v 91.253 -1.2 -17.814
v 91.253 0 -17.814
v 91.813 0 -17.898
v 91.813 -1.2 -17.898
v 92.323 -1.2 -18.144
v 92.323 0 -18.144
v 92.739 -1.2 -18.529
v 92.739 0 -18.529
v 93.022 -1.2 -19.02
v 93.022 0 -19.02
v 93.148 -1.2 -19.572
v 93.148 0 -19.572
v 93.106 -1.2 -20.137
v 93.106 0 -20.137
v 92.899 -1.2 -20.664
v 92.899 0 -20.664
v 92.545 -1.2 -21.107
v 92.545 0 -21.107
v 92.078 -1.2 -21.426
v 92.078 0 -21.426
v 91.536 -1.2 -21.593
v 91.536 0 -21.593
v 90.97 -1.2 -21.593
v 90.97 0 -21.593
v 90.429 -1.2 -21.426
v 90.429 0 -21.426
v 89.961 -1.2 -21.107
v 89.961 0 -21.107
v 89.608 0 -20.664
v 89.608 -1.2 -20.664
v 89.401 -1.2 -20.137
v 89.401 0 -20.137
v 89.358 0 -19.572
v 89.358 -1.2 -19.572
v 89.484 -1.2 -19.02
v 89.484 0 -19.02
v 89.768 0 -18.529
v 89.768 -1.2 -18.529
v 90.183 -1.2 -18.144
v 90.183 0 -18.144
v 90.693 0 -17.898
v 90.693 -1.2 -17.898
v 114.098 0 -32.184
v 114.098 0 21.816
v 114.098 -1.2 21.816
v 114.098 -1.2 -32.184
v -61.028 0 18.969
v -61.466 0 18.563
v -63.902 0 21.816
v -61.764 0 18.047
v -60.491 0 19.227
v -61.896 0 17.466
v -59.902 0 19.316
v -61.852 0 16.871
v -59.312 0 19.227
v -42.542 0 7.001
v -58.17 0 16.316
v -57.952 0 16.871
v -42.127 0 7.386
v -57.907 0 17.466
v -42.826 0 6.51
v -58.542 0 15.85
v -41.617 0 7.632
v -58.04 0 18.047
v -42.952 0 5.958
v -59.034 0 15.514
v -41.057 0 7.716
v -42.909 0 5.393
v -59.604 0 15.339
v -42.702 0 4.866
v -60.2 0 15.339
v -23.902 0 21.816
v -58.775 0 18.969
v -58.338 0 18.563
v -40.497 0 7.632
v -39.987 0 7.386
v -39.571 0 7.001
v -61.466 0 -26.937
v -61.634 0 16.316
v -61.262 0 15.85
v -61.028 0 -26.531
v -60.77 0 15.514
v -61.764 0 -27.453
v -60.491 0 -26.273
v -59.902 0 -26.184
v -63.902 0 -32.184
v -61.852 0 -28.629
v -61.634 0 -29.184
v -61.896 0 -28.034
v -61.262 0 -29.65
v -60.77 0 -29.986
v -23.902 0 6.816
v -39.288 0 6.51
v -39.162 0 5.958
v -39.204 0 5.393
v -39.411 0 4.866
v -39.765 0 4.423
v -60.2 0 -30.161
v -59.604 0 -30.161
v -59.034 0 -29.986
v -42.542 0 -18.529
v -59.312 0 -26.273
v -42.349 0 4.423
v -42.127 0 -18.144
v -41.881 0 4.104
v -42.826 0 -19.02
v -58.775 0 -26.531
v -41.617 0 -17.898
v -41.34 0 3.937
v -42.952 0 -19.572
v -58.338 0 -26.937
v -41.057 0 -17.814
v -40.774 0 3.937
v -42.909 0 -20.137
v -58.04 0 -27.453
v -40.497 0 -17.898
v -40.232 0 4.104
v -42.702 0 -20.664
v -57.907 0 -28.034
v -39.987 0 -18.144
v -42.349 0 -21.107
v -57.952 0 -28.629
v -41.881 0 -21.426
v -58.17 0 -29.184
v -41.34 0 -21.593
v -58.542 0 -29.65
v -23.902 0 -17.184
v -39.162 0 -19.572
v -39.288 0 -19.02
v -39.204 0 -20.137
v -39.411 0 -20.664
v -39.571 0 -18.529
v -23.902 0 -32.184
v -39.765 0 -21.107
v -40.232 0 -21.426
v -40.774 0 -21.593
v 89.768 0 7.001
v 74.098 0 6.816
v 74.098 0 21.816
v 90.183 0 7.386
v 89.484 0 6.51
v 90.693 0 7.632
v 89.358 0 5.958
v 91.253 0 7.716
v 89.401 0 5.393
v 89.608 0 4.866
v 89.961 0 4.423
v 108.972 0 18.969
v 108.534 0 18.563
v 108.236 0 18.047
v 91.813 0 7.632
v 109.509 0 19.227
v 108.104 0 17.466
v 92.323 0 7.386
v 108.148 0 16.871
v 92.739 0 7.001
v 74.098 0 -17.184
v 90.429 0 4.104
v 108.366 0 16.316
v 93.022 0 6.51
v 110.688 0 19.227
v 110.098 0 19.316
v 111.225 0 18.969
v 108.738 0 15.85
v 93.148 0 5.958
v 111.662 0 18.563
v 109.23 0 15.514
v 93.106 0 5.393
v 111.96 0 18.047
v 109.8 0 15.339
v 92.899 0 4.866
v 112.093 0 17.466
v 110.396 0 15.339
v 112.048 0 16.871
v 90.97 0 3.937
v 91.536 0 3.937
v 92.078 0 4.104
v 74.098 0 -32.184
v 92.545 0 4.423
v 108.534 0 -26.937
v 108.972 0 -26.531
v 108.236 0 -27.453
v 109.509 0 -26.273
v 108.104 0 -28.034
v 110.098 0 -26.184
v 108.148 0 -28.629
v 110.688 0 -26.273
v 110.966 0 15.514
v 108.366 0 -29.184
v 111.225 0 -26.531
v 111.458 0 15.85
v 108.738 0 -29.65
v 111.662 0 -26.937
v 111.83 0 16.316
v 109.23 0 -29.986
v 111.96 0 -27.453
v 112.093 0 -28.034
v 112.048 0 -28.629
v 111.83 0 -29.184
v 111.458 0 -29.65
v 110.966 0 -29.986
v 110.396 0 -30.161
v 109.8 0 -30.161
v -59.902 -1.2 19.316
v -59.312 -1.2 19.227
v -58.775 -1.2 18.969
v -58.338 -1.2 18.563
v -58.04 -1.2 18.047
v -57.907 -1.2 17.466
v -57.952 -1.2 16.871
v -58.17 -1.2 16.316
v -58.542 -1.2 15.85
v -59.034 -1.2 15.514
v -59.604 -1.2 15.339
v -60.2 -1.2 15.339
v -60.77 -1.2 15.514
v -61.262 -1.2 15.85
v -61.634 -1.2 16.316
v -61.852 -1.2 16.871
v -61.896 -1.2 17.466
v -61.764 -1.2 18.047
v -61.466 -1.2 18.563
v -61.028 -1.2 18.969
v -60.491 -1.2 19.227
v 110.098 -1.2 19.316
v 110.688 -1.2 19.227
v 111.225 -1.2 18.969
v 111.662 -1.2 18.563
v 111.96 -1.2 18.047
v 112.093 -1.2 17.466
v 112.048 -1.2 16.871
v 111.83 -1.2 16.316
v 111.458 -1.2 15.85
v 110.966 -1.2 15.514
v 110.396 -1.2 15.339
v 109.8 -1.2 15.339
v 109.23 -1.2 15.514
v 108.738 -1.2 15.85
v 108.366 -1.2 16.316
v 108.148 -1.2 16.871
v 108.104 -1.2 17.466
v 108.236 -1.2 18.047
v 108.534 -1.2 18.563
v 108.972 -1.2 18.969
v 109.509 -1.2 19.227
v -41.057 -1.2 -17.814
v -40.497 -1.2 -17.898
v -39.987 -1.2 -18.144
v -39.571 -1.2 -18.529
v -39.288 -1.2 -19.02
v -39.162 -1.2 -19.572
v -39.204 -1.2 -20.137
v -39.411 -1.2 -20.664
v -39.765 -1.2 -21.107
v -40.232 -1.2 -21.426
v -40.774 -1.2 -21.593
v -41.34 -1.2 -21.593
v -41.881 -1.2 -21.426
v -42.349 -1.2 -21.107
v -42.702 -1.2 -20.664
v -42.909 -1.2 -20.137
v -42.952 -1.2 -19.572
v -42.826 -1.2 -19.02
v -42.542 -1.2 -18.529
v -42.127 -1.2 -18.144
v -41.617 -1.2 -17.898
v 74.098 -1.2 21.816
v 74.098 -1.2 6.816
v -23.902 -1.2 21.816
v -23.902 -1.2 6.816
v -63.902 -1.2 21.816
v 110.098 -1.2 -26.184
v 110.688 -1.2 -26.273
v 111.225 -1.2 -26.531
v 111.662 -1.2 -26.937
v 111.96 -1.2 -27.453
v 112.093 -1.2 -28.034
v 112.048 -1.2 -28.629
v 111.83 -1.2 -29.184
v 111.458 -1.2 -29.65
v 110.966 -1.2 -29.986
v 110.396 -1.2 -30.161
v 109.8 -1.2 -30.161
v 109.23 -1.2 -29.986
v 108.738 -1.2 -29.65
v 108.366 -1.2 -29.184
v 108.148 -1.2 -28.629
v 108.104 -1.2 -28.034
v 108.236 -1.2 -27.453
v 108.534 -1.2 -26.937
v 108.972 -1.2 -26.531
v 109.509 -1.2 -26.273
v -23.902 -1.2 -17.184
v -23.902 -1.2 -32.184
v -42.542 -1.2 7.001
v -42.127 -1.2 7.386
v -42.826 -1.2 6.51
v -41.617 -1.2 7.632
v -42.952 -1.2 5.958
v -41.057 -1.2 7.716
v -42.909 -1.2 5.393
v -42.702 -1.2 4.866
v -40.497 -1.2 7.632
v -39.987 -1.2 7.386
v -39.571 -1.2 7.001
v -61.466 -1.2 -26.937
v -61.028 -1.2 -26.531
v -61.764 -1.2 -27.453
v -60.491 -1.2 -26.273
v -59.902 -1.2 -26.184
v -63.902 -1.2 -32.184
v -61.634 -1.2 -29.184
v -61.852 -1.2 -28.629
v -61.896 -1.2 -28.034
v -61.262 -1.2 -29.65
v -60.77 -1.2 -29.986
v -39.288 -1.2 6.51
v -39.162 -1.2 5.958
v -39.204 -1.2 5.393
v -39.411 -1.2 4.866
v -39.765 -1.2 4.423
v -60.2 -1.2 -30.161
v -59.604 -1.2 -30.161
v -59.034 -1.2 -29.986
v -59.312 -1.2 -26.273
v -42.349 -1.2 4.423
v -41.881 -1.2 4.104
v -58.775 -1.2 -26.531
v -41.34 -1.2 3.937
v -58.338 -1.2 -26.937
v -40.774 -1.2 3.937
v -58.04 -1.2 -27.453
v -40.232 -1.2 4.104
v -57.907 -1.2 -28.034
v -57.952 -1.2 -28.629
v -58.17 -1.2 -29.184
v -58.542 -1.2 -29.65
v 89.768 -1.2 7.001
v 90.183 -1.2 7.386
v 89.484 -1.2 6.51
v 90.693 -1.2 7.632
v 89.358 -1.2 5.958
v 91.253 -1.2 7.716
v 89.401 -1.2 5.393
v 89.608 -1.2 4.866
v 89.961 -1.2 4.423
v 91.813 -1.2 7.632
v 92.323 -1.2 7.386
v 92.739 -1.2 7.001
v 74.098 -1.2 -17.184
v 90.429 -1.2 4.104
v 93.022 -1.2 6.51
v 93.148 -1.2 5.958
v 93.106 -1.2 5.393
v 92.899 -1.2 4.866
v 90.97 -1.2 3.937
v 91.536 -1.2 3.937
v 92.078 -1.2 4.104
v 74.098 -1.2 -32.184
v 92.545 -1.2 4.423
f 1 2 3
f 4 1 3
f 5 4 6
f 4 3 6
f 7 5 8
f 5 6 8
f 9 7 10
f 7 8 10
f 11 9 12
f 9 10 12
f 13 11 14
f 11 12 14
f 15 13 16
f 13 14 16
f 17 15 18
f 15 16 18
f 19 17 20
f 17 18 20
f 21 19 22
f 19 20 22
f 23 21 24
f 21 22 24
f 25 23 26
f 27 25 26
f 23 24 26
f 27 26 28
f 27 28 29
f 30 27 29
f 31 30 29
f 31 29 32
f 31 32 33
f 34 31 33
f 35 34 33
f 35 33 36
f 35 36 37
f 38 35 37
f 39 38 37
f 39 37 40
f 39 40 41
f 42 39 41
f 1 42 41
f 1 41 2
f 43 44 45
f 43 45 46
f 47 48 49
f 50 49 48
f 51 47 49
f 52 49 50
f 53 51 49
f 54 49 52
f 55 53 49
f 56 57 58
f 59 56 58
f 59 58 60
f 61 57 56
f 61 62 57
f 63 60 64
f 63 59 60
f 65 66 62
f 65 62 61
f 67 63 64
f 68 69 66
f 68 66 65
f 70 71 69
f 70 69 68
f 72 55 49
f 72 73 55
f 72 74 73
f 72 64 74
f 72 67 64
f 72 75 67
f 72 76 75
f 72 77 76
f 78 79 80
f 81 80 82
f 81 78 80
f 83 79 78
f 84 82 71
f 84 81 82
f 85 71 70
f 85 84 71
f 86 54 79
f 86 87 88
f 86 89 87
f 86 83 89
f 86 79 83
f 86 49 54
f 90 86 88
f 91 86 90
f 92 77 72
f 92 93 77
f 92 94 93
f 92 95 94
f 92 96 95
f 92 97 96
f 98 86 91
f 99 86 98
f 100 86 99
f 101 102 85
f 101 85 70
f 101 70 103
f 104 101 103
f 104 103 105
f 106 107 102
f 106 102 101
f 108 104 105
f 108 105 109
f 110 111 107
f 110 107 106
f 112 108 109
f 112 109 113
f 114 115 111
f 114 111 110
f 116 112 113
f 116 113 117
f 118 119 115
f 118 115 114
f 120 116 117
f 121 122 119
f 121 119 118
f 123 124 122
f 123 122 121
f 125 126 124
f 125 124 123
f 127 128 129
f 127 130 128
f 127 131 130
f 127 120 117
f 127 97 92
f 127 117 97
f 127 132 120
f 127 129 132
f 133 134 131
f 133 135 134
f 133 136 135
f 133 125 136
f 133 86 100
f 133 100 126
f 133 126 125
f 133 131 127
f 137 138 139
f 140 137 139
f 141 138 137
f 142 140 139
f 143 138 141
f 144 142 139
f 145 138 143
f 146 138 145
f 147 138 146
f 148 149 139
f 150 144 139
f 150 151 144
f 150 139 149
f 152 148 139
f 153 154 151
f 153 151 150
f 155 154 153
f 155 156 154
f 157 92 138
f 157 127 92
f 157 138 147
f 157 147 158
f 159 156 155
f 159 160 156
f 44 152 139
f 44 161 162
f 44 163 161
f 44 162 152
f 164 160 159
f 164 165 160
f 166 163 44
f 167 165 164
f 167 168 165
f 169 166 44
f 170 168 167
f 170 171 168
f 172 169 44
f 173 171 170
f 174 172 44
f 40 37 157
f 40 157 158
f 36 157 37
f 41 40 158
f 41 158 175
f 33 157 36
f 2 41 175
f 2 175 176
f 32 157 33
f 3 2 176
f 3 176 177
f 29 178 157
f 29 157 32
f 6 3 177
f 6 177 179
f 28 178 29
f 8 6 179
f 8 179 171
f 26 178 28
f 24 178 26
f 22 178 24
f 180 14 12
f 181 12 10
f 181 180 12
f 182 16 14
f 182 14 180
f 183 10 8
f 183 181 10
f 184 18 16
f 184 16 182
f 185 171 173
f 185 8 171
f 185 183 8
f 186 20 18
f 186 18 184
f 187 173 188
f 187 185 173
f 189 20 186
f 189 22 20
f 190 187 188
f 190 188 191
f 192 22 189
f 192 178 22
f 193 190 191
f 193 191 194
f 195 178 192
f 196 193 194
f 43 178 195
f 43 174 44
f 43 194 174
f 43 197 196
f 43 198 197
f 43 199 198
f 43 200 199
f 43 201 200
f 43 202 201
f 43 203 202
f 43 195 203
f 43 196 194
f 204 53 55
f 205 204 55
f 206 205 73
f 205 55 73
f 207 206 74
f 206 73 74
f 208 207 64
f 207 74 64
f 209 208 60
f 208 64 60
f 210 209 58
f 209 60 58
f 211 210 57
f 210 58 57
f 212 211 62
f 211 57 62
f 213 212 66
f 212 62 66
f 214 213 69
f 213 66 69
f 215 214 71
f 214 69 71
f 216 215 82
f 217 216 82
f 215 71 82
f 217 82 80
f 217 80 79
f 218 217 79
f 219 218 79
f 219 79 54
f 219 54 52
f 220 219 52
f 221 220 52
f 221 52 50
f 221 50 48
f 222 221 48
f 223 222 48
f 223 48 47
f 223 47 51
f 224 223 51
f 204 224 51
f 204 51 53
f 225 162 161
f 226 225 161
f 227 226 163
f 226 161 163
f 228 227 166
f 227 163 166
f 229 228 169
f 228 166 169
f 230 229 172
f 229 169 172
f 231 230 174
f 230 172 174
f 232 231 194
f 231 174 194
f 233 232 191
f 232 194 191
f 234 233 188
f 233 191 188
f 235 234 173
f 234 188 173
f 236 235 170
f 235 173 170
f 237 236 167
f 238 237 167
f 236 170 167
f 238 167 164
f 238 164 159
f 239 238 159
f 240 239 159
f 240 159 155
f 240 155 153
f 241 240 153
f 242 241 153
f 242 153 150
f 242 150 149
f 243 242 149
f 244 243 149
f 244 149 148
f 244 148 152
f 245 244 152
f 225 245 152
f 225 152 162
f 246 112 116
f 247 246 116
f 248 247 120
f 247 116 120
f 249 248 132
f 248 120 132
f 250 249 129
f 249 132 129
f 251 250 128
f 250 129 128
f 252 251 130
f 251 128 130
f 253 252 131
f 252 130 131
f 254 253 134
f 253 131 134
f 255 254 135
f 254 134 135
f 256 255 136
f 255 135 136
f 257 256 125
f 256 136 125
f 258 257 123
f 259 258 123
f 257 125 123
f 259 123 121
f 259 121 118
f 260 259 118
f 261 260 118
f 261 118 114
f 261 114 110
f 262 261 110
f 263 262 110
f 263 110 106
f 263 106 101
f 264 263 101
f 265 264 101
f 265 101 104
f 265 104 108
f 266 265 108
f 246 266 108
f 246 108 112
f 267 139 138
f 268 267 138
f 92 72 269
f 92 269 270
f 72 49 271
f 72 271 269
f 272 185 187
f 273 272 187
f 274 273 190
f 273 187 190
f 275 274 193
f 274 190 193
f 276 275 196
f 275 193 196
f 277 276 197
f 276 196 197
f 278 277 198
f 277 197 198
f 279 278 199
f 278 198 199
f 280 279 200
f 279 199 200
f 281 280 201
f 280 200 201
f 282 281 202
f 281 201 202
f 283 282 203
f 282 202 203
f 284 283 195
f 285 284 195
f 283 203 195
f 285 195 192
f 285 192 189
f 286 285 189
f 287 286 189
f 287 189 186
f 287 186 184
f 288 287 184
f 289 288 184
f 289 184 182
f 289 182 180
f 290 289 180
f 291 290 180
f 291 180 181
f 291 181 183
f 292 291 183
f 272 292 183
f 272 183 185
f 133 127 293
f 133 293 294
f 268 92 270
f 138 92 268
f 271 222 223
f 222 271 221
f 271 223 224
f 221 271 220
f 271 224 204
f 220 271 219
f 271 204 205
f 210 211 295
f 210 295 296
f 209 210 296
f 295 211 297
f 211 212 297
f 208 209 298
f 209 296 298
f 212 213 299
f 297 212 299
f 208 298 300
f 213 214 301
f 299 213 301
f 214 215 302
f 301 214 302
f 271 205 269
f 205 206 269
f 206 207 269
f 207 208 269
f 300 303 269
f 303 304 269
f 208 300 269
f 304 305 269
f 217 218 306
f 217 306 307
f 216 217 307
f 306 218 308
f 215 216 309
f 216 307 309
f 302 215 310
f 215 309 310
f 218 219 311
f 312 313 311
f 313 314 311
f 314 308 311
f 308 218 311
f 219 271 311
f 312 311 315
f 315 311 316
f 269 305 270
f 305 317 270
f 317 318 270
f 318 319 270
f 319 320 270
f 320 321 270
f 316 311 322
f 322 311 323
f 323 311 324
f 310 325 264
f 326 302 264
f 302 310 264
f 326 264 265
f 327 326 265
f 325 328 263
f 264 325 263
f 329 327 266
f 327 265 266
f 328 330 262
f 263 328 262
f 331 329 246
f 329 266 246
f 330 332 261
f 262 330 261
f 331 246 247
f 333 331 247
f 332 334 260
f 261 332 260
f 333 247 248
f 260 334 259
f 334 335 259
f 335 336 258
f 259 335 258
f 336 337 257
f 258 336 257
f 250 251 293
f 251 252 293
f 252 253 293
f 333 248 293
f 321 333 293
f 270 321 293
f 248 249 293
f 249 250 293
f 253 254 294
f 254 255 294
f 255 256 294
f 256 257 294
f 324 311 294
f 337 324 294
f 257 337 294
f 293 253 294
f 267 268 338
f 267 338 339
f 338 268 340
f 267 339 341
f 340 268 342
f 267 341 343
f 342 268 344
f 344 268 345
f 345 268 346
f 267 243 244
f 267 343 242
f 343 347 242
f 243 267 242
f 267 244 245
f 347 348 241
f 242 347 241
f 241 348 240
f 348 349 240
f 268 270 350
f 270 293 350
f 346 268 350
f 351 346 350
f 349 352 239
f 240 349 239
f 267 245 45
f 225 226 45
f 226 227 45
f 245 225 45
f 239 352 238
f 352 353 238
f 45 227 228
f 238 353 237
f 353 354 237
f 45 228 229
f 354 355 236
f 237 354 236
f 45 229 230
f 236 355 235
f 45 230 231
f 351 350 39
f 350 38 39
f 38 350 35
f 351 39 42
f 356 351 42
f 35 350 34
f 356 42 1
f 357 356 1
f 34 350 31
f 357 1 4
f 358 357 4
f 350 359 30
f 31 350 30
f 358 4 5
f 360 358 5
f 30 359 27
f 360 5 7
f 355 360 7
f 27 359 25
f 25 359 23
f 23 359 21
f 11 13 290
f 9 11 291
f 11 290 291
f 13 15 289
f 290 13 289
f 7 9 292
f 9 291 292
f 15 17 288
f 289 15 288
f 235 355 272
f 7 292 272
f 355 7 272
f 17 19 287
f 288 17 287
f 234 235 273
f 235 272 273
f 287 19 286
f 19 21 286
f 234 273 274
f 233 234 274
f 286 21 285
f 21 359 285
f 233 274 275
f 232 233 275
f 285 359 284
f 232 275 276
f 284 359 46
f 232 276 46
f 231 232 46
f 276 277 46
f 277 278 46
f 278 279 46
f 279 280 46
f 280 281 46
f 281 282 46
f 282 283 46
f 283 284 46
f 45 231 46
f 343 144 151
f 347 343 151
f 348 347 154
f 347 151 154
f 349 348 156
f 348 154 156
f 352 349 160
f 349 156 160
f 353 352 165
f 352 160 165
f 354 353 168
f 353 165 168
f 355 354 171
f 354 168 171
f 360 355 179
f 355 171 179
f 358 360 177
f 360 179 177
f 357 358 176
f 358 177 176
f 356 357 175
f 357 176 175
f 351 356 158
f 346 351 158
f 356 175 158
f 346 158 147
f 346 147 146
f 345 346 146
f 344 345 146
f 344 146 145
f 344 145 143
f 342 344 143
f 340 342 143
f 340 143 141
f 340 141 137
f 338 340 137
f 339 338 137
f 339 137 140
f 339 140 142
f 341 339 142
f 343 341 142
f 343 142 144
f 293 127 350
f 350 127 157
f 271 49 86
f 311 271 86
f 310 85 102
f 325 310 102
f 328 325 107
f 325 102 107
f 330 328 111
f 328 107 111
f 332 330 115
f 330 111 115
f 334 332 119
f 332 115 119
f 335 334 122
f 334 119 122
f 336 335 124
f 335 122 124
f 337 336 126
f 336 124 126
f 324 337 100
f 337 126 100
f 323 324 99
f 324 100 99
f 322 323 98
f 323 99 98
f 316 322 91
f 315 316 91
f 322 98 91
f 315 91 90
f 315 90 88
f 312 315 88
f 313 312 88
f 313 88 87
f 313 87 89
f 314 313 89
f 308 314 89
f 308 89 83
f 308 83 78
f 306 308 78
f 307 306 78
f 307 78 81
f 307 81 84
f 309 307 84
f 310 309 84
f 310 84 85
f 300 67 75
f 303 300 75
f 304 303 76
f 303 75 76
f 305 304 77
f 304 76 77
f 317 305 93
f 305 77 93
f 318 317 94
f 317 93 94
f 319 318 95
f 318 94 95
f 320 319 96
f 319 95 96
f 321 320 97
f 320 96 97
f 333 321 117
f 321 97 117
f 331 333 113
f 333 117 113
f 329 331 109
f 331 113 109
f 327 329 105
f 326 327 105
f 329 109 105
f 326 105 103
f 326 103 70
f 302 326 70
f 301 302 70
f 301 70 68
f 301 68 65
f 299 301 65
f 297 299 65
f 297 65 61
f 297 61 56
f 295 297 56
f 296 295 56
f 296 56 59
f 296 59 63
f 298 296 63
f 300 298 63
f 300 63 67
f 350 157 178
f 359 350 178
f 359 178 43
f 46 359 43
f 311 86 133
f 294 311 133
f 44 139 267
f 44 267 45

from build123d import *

# Parameters (mm, degrees)
SKETCH1_W          = 178
SKETCH1_H          = 54
BASE_FLANGE1_DEPTH = 1.2
SKETCH2_R          = 1.9
CUT_EXTRUDE1_DEPTH = 10
SKETCH3_W          = 98
SKETCH3_H          = 15
CUT_EXTRUDE2_DEPTH = 10
SKETCH4_R          = 2
CUT_EXTRUDE3_DEPTH = 10
SKETCH5_R          = 2
CUT_EXTRUDE4_DEPTH = 10


# Sheet-metal steps are written as plain solids
with BuildPart() as part:
    # Sketch1 → Base-Flange1 (new body)
    with BuildSketch(Plane(origin=(0, 0, 0), x_dir=(1, 0, 0), z_dir=(0, 1, 0))):
        with Locations((25.098152401, 5.183748797)):
            Rectangle(SKETCH1_W, SKETCH1_H)
    extrude(amount=-BASE_FLANGE1_DEPTH)

    # Sketch2 → Cut-Extrude1 (cut)
    with BuildSketch(Plane(origin=(0, 0, 0), x_dir=(1, 0, 0), z_dir=(0, 1, 0))):
        with Locations(Location((91.253152401, -5.816251203, 0), (0, 0, 270))):
            Circle(SKETCH2_R)
        with Locations(Location((-41.056847599, -5.816251203, 0), (0, 0, 270))):
            Circle(SKETCH2_R)
        with Locations(Location((91.253152401, 19.713748797, 0), (0, 0, 270))):
            Circle(SKETCH2_R)
        with Locations(Location((-41.056847599, 19.713748797, 0), (0, 0, 270))):
            Circle(SKETCH2_R)
    extrude(amount=-CUT_EXTRUDE1_DEPTH, mode=Mode.SUBTRACT)

    # Sketch3 → Cut-Extrude2 (cut)
    with BuildSketch(Plane(origin=(0, 0, 0), x_dir=(1, 0, 0), z_dir=(0, 1, 0))):
        with Locations((25.098152401, -14.316251203)):
            Rectangle(SKETCH3_W, SKETCH3_H)
        with Locations((25.098152401, 24.683748797)):
            Rectangle(SKETCH3_W, SKETCH3_H)
    extrude(amount=-CUT_EXTRUDE2_DEPTH, mode=Mode.SUBTRACT)

    # Sketch4 → Cut-Extrude3 (cut)
    with BuildSketch(Plane(origin=(0, 0, 0), x_dir=(1, 0, 0), z_dir=(0, 1, 0))):
        with Locations(Location((110.098152401, -17.316251203, 0), (0, 0, 270))):
            Circle(SKETCH4_R)
        with Locations(Location((110.098152401, 28.183748797, 0), (0, 0, 270))):
            Circle(SKETCH4_R)
    extrude(amount=-CUT_EXTRUDE3_DEPTH, mode=Mode.SUBTRACT)

    # Sketch5 → Cut-Extrude4 (cut)
    with BuildSketch(Plane(origin=(0, 0, 0), x_dir=(1, 0, 0), z_dir=(0, 1, 0))):
        with Locations(Location((-59.901847599, -17.316251203, 0), (0, 0, 270))):
            Circle(SKETCH5_R)
        with Locations(Location((-59.901847599, 28.183748797, 0), (0, 0, 270))):
            Circle(SKETCH5_R)
    extrude(amount=-CUT_EXTRUDE4_DEPTH, mode=Mode.SUBTRACT)


solid = part.part
